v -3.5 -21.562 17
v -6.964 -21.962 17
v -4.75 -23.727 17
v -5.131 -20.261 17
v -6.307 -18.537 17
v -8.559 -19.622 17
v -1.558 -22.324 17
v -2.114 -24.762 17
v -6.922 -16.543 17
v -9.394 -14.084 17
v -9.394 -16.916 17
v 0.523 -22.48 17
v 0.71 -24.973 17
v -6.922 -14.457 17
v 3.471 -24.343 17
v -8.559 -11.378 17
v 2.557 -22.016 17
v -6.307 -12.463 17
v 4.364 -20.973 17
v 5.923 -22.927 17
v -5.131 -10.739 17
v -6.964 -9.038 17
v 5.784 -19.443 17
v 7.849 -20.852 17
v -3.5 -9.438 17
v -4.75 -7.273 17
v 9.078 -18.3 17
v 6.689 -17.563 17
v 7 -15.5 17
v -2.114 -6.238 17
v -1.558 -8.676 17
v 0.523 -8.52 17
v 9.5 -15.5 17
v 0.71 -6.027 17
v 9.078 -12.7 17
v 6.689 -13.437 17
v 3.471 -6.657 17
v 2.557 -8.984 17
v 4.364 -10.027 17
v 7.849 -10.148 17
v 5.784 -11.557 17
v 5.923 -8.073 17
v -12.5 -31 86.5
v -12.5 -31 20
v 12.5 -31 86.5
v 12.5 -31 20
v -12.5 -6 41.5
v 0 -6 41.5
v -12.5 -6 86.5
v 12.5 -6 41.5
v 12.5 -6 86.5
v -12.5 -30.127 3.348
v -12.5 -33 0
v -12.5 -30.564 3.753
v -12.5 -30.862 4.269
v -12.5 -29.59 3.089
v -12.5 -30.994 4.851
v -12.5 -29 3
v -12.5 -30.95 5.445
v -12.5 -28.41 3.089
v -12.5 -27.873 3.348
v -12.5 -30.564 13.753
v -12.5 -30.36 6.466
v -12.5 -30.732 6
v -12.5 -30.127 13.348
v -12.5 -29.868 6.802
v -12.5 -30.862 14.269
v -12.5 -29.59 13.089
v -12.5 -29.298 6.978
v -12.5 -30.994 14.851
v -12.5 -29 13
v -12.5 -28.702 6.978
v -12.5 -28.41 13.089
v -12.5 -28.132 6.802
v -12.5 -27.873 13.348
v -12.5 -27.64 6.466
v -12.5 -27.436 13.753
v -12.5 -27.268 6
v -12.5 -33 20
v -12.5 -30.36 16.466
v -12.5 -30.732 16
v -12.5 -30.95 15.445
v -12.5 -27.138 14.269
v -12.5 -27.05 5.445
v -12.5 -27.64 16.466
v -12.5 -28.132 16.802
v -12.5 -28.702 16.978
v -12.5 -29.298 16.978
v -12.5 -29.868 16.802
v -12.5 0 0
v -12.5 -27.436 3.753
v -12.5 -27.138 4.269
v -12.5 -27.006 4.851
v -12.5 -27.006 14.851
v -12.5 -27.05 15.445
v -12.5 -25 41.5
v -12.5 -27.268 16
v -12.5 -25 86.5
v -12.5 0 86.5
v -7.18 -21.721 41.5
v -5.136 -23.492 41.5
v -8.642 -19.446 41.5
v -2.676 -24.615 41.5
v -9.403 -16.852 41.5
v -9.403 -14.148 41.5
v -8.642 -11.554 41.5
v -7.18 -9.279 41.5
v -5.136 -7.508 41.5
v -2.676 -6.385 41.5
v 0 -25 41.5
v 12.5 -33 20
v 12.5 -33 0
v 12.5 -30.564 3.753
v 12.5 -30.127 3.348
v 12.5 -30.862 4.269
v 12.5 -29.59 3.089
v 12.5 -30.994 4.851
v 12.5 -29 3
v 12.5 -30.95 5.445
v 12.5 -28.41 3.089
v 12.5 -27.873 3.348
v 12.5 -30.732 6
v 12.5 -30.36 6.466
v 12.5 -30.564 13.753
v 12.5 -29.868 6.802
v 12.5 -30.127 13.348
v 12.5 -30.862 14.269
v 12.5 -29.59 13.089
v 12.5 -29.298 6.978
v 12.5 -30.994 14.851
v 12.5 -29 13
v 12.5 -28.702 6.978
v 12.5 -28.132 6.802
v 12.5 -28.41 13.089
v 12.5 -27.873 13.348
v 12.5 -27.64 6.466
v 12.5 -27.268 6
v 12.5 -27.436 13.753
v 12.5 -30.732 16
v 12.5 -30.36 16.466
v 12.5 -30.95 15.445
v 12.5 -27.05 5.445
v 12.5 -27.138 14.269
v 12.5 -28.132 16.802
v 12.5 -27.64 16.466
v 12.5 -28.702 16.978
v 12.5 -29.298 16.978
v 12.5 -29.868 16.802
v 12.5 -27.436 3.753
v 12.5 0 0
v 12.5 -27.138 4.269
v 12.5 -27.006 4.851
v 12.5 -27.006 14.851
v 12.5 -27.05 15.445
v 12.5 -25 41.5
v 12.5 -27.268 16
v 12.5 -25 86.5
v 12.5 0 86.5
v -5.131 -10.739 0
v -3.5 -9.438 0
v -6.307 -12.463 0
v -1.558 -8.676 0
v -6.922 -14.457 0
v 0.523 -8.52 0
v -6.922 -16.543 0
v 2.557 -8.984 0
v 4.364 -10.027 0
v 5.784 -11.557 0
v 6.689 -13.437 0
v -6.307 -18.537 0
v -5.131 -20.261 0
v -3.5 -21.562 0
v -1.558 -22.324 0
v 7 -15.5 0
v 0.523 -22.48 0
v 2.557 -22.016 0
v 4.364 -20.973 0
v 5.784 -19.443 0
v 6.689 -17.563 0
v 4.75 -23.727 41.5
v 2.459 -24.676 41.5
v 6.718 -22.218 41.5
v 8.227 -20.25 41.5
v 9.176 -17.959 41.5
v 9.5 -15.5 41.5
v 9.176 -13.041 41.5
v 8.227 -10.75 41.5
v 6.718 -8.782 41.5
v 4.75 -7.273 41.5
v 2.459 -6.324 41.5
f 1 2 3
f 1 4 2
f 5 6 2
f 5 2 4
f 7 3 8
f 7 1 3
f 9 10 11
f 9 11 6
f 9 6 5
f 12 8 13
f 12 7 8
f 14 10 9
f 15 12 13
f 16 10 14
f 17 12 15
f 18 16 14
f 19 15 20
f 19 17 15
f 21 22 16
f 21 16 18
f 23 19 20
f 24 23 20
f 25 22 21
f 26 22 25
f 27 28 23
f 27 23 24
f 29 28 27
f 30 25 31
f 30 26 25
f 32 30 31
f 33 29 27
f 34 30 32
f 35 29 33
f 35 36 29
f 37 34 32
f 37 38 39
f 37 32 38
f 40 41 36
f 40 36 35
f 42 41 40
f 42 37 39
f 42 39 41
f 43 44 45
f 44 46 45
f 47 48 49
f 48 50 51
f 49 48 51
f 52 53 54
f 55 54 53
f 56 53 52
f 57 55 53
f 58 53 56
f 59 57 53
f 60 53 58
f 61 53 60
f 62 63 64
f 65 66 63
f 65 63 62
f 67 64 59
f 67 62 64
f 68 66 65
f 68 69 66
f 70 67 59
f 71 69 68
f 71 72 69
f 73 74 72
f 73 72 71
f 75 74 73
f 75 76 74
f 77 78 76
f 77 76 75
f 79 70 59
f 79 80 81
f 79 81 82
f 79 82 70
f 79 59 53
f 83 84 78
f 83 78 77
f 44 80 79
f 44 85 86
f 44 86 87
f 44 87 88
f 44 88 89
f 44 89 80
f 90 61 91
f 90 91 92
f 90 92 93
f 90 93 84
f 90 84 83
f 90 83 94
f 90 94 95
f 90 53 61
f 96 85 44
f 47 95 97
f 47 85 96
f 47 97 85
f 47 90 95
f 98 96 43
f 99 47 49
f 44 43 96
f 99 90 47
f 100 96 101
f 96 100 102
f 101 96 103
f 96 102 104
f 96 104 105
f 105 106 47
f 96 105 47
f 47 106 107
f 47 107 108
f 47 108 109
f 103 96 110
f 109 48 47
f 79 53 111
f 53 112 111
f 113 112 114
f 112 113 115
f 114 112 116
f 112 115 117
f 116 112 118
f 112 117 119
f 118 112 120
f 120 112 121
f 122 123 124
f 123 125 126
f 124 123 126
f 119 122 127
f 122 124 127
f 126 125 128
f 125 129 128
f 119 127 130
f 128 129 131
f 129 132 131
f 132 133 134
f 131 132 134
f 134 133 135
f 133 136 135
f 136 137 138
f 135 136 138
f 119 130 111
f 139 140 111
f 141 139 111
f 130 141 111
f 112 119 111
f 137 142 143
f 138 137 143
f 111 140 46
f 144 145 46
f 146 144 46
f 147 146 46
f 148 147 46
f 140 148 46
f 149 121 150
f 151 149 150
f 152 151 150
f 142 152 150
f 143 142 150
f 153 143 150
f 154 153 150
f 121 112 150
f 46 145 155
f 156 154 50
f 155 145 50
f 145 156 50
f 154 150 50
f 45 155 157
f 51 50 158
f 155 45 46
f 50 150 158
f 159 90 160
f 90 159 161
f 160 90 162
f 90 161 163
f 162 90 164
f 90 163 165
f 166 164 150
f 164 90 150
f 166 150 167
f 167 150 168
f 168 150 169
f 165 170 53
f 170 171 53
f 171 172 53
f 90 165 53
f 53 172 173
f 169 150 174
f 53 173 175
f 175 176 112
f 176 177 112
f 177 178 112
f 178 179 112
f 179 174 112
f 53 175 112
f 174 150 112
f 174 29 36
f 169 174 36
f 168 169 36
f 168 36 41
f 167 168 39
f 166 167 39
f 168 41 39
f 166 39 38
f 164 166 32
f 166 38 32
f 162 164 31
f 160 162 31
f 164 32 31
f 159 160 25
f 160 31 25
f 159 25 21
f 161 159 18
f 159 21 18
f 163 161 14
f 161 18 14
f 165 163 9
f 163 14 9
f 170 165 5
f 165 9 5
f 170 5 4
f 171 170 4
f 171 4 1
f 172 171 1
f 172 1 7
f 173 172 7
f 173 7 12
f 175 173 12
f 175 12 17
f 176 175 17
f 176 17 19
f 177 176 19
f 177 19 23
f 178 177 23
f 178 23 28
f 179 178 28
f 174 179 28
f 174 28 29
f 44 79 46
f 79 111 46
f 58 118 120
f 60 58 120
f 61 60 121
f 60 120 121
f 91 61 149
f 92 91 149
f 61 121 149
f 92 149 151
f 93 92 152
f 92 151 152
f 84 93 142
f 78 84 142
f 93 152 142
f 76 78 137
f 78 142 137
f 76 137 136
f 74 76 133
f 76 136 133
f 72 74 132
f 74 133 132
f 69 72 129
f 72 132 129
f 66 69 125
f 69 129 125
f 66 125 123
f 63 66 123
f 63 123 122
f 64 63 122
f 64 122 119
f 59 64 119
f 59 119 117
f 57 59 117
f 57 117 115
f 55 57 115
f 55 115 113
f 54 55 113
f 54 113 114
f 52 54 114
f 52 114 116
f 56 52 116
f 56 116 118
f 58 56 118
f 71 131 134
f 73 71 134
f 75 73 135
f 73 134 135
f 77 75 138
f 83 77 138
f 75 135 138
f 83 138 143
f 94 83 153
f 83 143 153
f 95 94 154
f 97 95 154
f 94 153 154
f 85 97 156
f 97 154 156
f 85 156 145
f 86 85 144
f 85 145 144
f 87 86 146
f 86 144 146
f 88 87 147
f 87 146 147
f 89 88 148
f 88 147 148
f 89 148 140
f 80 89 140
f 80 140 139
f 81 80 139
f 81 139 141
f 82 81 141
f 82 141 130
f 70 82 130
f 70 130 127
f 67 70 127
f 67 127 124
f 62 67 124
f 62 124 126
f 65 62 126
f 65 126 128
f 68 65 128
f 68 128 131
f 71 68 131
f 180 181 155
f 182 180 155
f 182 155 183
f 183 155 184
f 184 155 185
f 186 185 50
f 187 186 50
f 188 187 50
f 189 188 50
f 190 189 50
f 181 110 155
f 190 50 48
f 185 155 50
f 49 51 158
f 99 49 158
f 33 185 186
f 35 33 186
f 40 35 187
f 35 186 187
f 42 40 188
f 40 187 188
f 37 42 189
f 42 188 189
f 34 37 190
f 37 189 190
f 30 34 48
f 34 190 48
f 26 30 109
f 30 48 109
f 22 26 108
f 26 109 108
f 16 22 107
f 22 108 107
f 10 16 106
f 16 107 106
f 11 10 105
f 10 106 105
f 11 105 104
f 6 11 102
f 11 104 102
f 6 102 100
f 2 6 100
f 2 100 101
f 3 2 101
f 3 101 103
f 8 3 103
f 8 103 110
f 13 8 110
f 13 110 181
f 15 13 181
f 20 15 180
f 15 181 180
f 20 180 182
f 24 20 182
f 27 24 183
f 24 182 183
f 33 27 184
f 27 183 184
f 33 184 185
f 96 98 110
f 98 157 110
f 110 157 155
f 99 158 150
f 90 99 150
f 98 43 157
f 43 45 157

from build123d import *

# Parameters (mm, degrees)
BOSS_EXTRUDE1_DEPTH = 12.5
SKETCH2_R           = 9.5
CUT_EXTRUDE1_DEPTH  = 24.5
CUT_EXTRUDE2_REACH  = 79.945
SKETCH3_R           = 7
CUT_EXTRUDE3_REACH  = 97.897
SKETCH4_R           = 2


with BuildPart() as part:
    # Sketch1 → Boss-Extrude1 (new, symmetric)
    with BuildSketch(Plane(origin=(0, 0, 0), x_dir=(0, 0, -1), z_dir=(1, 0, 0))):
        Polygon((0, 0), (0, -33), (-20, -33), (-20, -31), (-86.5, -31), (-86.5, -25), (-41.5, -25), (-41.5, -6), (-86.5, -6), (-86.5, 0), align=None)
    extrude(amount=BOSS_EXTRUDE1_DEPTH, both=True)

    # Sketch2 → Cut-Extrude1 (cut)
    with BuildSketch(Plane.XY.offset(41.5)):
        with Locations((0, -15.5)):
            Circle(SKETCH2_R)
    extrude(amount=-CUT_EXTRUDE1_DEPTH, mode=Mode.SUBTRACT)

    # Sketch3 → Cut-Extrude2 (cut, up to next)
    with BuildSketch(Plane.XY.offset(17), mode=Mode.PRIVATE) as cut_extrude2_sk1:
        with Locations((0, -15.5)):
            Circle(SKETCH3_R)
    cut_extrude2_tool1 = extrude(cut_extrude2_sk1.sketch, amount=-CUT_EXTRUDE2_REACH, mode=Mode.PRIVATE) & part.part
    add(cut_extrude2_tool1.solids().sort_by_distance((0, -15.5, 17))[0], mode=Mode.SUBTRACT)

    # Sketch4 → Cut-Extrude3 (cut, up to next)
    with BuildSketch(Plane(origin=(12.5, 0, 0), x_dir=(0, 0, -1), z_dir=(1, 0, 0)), mode=Mode.PRIVATE) as cut_extrude3_sk1:
        with Locations((-15, -29)):
            Circle(SKETCH4_R)
    cut_extrude3_tool1 = extrude(cut_extrude3_sk1.sketch, amount=-CUT_EXTRUDE3_REACH, mode=Mode.PRIVATE) & part.part
    # Sketch4 → Cut-Extrude3 (cut, up to next)
    with BuildSketch(Plane(origin=(12.5, 0, 0), x_dir=(0, 0, -1), z_dir=(1, 0, 0)), mode=Mode.PRIVATE) as cut_extrude3_sk2:
        with Locations((-5, -29)):
            Circle(SKETCH4_R)
    cut_extrude3_tool2 = extrude(cut_extrude3_sk2.sketch, amount=-CUT_EXTRUDE3_REACH, mode=Mode.PRIVATE) & part.part
    add(cut_extrude3_tool1.solids().sort_by_distance((12.5, -29, 15))[0], mode=Mode.SUBTRACT)
    add(cut_extrude3_tool2.solids().sort_by_distance((12.5, -29, 5))[0], mode=Mode.SUBTRACT)


solid = part.part
